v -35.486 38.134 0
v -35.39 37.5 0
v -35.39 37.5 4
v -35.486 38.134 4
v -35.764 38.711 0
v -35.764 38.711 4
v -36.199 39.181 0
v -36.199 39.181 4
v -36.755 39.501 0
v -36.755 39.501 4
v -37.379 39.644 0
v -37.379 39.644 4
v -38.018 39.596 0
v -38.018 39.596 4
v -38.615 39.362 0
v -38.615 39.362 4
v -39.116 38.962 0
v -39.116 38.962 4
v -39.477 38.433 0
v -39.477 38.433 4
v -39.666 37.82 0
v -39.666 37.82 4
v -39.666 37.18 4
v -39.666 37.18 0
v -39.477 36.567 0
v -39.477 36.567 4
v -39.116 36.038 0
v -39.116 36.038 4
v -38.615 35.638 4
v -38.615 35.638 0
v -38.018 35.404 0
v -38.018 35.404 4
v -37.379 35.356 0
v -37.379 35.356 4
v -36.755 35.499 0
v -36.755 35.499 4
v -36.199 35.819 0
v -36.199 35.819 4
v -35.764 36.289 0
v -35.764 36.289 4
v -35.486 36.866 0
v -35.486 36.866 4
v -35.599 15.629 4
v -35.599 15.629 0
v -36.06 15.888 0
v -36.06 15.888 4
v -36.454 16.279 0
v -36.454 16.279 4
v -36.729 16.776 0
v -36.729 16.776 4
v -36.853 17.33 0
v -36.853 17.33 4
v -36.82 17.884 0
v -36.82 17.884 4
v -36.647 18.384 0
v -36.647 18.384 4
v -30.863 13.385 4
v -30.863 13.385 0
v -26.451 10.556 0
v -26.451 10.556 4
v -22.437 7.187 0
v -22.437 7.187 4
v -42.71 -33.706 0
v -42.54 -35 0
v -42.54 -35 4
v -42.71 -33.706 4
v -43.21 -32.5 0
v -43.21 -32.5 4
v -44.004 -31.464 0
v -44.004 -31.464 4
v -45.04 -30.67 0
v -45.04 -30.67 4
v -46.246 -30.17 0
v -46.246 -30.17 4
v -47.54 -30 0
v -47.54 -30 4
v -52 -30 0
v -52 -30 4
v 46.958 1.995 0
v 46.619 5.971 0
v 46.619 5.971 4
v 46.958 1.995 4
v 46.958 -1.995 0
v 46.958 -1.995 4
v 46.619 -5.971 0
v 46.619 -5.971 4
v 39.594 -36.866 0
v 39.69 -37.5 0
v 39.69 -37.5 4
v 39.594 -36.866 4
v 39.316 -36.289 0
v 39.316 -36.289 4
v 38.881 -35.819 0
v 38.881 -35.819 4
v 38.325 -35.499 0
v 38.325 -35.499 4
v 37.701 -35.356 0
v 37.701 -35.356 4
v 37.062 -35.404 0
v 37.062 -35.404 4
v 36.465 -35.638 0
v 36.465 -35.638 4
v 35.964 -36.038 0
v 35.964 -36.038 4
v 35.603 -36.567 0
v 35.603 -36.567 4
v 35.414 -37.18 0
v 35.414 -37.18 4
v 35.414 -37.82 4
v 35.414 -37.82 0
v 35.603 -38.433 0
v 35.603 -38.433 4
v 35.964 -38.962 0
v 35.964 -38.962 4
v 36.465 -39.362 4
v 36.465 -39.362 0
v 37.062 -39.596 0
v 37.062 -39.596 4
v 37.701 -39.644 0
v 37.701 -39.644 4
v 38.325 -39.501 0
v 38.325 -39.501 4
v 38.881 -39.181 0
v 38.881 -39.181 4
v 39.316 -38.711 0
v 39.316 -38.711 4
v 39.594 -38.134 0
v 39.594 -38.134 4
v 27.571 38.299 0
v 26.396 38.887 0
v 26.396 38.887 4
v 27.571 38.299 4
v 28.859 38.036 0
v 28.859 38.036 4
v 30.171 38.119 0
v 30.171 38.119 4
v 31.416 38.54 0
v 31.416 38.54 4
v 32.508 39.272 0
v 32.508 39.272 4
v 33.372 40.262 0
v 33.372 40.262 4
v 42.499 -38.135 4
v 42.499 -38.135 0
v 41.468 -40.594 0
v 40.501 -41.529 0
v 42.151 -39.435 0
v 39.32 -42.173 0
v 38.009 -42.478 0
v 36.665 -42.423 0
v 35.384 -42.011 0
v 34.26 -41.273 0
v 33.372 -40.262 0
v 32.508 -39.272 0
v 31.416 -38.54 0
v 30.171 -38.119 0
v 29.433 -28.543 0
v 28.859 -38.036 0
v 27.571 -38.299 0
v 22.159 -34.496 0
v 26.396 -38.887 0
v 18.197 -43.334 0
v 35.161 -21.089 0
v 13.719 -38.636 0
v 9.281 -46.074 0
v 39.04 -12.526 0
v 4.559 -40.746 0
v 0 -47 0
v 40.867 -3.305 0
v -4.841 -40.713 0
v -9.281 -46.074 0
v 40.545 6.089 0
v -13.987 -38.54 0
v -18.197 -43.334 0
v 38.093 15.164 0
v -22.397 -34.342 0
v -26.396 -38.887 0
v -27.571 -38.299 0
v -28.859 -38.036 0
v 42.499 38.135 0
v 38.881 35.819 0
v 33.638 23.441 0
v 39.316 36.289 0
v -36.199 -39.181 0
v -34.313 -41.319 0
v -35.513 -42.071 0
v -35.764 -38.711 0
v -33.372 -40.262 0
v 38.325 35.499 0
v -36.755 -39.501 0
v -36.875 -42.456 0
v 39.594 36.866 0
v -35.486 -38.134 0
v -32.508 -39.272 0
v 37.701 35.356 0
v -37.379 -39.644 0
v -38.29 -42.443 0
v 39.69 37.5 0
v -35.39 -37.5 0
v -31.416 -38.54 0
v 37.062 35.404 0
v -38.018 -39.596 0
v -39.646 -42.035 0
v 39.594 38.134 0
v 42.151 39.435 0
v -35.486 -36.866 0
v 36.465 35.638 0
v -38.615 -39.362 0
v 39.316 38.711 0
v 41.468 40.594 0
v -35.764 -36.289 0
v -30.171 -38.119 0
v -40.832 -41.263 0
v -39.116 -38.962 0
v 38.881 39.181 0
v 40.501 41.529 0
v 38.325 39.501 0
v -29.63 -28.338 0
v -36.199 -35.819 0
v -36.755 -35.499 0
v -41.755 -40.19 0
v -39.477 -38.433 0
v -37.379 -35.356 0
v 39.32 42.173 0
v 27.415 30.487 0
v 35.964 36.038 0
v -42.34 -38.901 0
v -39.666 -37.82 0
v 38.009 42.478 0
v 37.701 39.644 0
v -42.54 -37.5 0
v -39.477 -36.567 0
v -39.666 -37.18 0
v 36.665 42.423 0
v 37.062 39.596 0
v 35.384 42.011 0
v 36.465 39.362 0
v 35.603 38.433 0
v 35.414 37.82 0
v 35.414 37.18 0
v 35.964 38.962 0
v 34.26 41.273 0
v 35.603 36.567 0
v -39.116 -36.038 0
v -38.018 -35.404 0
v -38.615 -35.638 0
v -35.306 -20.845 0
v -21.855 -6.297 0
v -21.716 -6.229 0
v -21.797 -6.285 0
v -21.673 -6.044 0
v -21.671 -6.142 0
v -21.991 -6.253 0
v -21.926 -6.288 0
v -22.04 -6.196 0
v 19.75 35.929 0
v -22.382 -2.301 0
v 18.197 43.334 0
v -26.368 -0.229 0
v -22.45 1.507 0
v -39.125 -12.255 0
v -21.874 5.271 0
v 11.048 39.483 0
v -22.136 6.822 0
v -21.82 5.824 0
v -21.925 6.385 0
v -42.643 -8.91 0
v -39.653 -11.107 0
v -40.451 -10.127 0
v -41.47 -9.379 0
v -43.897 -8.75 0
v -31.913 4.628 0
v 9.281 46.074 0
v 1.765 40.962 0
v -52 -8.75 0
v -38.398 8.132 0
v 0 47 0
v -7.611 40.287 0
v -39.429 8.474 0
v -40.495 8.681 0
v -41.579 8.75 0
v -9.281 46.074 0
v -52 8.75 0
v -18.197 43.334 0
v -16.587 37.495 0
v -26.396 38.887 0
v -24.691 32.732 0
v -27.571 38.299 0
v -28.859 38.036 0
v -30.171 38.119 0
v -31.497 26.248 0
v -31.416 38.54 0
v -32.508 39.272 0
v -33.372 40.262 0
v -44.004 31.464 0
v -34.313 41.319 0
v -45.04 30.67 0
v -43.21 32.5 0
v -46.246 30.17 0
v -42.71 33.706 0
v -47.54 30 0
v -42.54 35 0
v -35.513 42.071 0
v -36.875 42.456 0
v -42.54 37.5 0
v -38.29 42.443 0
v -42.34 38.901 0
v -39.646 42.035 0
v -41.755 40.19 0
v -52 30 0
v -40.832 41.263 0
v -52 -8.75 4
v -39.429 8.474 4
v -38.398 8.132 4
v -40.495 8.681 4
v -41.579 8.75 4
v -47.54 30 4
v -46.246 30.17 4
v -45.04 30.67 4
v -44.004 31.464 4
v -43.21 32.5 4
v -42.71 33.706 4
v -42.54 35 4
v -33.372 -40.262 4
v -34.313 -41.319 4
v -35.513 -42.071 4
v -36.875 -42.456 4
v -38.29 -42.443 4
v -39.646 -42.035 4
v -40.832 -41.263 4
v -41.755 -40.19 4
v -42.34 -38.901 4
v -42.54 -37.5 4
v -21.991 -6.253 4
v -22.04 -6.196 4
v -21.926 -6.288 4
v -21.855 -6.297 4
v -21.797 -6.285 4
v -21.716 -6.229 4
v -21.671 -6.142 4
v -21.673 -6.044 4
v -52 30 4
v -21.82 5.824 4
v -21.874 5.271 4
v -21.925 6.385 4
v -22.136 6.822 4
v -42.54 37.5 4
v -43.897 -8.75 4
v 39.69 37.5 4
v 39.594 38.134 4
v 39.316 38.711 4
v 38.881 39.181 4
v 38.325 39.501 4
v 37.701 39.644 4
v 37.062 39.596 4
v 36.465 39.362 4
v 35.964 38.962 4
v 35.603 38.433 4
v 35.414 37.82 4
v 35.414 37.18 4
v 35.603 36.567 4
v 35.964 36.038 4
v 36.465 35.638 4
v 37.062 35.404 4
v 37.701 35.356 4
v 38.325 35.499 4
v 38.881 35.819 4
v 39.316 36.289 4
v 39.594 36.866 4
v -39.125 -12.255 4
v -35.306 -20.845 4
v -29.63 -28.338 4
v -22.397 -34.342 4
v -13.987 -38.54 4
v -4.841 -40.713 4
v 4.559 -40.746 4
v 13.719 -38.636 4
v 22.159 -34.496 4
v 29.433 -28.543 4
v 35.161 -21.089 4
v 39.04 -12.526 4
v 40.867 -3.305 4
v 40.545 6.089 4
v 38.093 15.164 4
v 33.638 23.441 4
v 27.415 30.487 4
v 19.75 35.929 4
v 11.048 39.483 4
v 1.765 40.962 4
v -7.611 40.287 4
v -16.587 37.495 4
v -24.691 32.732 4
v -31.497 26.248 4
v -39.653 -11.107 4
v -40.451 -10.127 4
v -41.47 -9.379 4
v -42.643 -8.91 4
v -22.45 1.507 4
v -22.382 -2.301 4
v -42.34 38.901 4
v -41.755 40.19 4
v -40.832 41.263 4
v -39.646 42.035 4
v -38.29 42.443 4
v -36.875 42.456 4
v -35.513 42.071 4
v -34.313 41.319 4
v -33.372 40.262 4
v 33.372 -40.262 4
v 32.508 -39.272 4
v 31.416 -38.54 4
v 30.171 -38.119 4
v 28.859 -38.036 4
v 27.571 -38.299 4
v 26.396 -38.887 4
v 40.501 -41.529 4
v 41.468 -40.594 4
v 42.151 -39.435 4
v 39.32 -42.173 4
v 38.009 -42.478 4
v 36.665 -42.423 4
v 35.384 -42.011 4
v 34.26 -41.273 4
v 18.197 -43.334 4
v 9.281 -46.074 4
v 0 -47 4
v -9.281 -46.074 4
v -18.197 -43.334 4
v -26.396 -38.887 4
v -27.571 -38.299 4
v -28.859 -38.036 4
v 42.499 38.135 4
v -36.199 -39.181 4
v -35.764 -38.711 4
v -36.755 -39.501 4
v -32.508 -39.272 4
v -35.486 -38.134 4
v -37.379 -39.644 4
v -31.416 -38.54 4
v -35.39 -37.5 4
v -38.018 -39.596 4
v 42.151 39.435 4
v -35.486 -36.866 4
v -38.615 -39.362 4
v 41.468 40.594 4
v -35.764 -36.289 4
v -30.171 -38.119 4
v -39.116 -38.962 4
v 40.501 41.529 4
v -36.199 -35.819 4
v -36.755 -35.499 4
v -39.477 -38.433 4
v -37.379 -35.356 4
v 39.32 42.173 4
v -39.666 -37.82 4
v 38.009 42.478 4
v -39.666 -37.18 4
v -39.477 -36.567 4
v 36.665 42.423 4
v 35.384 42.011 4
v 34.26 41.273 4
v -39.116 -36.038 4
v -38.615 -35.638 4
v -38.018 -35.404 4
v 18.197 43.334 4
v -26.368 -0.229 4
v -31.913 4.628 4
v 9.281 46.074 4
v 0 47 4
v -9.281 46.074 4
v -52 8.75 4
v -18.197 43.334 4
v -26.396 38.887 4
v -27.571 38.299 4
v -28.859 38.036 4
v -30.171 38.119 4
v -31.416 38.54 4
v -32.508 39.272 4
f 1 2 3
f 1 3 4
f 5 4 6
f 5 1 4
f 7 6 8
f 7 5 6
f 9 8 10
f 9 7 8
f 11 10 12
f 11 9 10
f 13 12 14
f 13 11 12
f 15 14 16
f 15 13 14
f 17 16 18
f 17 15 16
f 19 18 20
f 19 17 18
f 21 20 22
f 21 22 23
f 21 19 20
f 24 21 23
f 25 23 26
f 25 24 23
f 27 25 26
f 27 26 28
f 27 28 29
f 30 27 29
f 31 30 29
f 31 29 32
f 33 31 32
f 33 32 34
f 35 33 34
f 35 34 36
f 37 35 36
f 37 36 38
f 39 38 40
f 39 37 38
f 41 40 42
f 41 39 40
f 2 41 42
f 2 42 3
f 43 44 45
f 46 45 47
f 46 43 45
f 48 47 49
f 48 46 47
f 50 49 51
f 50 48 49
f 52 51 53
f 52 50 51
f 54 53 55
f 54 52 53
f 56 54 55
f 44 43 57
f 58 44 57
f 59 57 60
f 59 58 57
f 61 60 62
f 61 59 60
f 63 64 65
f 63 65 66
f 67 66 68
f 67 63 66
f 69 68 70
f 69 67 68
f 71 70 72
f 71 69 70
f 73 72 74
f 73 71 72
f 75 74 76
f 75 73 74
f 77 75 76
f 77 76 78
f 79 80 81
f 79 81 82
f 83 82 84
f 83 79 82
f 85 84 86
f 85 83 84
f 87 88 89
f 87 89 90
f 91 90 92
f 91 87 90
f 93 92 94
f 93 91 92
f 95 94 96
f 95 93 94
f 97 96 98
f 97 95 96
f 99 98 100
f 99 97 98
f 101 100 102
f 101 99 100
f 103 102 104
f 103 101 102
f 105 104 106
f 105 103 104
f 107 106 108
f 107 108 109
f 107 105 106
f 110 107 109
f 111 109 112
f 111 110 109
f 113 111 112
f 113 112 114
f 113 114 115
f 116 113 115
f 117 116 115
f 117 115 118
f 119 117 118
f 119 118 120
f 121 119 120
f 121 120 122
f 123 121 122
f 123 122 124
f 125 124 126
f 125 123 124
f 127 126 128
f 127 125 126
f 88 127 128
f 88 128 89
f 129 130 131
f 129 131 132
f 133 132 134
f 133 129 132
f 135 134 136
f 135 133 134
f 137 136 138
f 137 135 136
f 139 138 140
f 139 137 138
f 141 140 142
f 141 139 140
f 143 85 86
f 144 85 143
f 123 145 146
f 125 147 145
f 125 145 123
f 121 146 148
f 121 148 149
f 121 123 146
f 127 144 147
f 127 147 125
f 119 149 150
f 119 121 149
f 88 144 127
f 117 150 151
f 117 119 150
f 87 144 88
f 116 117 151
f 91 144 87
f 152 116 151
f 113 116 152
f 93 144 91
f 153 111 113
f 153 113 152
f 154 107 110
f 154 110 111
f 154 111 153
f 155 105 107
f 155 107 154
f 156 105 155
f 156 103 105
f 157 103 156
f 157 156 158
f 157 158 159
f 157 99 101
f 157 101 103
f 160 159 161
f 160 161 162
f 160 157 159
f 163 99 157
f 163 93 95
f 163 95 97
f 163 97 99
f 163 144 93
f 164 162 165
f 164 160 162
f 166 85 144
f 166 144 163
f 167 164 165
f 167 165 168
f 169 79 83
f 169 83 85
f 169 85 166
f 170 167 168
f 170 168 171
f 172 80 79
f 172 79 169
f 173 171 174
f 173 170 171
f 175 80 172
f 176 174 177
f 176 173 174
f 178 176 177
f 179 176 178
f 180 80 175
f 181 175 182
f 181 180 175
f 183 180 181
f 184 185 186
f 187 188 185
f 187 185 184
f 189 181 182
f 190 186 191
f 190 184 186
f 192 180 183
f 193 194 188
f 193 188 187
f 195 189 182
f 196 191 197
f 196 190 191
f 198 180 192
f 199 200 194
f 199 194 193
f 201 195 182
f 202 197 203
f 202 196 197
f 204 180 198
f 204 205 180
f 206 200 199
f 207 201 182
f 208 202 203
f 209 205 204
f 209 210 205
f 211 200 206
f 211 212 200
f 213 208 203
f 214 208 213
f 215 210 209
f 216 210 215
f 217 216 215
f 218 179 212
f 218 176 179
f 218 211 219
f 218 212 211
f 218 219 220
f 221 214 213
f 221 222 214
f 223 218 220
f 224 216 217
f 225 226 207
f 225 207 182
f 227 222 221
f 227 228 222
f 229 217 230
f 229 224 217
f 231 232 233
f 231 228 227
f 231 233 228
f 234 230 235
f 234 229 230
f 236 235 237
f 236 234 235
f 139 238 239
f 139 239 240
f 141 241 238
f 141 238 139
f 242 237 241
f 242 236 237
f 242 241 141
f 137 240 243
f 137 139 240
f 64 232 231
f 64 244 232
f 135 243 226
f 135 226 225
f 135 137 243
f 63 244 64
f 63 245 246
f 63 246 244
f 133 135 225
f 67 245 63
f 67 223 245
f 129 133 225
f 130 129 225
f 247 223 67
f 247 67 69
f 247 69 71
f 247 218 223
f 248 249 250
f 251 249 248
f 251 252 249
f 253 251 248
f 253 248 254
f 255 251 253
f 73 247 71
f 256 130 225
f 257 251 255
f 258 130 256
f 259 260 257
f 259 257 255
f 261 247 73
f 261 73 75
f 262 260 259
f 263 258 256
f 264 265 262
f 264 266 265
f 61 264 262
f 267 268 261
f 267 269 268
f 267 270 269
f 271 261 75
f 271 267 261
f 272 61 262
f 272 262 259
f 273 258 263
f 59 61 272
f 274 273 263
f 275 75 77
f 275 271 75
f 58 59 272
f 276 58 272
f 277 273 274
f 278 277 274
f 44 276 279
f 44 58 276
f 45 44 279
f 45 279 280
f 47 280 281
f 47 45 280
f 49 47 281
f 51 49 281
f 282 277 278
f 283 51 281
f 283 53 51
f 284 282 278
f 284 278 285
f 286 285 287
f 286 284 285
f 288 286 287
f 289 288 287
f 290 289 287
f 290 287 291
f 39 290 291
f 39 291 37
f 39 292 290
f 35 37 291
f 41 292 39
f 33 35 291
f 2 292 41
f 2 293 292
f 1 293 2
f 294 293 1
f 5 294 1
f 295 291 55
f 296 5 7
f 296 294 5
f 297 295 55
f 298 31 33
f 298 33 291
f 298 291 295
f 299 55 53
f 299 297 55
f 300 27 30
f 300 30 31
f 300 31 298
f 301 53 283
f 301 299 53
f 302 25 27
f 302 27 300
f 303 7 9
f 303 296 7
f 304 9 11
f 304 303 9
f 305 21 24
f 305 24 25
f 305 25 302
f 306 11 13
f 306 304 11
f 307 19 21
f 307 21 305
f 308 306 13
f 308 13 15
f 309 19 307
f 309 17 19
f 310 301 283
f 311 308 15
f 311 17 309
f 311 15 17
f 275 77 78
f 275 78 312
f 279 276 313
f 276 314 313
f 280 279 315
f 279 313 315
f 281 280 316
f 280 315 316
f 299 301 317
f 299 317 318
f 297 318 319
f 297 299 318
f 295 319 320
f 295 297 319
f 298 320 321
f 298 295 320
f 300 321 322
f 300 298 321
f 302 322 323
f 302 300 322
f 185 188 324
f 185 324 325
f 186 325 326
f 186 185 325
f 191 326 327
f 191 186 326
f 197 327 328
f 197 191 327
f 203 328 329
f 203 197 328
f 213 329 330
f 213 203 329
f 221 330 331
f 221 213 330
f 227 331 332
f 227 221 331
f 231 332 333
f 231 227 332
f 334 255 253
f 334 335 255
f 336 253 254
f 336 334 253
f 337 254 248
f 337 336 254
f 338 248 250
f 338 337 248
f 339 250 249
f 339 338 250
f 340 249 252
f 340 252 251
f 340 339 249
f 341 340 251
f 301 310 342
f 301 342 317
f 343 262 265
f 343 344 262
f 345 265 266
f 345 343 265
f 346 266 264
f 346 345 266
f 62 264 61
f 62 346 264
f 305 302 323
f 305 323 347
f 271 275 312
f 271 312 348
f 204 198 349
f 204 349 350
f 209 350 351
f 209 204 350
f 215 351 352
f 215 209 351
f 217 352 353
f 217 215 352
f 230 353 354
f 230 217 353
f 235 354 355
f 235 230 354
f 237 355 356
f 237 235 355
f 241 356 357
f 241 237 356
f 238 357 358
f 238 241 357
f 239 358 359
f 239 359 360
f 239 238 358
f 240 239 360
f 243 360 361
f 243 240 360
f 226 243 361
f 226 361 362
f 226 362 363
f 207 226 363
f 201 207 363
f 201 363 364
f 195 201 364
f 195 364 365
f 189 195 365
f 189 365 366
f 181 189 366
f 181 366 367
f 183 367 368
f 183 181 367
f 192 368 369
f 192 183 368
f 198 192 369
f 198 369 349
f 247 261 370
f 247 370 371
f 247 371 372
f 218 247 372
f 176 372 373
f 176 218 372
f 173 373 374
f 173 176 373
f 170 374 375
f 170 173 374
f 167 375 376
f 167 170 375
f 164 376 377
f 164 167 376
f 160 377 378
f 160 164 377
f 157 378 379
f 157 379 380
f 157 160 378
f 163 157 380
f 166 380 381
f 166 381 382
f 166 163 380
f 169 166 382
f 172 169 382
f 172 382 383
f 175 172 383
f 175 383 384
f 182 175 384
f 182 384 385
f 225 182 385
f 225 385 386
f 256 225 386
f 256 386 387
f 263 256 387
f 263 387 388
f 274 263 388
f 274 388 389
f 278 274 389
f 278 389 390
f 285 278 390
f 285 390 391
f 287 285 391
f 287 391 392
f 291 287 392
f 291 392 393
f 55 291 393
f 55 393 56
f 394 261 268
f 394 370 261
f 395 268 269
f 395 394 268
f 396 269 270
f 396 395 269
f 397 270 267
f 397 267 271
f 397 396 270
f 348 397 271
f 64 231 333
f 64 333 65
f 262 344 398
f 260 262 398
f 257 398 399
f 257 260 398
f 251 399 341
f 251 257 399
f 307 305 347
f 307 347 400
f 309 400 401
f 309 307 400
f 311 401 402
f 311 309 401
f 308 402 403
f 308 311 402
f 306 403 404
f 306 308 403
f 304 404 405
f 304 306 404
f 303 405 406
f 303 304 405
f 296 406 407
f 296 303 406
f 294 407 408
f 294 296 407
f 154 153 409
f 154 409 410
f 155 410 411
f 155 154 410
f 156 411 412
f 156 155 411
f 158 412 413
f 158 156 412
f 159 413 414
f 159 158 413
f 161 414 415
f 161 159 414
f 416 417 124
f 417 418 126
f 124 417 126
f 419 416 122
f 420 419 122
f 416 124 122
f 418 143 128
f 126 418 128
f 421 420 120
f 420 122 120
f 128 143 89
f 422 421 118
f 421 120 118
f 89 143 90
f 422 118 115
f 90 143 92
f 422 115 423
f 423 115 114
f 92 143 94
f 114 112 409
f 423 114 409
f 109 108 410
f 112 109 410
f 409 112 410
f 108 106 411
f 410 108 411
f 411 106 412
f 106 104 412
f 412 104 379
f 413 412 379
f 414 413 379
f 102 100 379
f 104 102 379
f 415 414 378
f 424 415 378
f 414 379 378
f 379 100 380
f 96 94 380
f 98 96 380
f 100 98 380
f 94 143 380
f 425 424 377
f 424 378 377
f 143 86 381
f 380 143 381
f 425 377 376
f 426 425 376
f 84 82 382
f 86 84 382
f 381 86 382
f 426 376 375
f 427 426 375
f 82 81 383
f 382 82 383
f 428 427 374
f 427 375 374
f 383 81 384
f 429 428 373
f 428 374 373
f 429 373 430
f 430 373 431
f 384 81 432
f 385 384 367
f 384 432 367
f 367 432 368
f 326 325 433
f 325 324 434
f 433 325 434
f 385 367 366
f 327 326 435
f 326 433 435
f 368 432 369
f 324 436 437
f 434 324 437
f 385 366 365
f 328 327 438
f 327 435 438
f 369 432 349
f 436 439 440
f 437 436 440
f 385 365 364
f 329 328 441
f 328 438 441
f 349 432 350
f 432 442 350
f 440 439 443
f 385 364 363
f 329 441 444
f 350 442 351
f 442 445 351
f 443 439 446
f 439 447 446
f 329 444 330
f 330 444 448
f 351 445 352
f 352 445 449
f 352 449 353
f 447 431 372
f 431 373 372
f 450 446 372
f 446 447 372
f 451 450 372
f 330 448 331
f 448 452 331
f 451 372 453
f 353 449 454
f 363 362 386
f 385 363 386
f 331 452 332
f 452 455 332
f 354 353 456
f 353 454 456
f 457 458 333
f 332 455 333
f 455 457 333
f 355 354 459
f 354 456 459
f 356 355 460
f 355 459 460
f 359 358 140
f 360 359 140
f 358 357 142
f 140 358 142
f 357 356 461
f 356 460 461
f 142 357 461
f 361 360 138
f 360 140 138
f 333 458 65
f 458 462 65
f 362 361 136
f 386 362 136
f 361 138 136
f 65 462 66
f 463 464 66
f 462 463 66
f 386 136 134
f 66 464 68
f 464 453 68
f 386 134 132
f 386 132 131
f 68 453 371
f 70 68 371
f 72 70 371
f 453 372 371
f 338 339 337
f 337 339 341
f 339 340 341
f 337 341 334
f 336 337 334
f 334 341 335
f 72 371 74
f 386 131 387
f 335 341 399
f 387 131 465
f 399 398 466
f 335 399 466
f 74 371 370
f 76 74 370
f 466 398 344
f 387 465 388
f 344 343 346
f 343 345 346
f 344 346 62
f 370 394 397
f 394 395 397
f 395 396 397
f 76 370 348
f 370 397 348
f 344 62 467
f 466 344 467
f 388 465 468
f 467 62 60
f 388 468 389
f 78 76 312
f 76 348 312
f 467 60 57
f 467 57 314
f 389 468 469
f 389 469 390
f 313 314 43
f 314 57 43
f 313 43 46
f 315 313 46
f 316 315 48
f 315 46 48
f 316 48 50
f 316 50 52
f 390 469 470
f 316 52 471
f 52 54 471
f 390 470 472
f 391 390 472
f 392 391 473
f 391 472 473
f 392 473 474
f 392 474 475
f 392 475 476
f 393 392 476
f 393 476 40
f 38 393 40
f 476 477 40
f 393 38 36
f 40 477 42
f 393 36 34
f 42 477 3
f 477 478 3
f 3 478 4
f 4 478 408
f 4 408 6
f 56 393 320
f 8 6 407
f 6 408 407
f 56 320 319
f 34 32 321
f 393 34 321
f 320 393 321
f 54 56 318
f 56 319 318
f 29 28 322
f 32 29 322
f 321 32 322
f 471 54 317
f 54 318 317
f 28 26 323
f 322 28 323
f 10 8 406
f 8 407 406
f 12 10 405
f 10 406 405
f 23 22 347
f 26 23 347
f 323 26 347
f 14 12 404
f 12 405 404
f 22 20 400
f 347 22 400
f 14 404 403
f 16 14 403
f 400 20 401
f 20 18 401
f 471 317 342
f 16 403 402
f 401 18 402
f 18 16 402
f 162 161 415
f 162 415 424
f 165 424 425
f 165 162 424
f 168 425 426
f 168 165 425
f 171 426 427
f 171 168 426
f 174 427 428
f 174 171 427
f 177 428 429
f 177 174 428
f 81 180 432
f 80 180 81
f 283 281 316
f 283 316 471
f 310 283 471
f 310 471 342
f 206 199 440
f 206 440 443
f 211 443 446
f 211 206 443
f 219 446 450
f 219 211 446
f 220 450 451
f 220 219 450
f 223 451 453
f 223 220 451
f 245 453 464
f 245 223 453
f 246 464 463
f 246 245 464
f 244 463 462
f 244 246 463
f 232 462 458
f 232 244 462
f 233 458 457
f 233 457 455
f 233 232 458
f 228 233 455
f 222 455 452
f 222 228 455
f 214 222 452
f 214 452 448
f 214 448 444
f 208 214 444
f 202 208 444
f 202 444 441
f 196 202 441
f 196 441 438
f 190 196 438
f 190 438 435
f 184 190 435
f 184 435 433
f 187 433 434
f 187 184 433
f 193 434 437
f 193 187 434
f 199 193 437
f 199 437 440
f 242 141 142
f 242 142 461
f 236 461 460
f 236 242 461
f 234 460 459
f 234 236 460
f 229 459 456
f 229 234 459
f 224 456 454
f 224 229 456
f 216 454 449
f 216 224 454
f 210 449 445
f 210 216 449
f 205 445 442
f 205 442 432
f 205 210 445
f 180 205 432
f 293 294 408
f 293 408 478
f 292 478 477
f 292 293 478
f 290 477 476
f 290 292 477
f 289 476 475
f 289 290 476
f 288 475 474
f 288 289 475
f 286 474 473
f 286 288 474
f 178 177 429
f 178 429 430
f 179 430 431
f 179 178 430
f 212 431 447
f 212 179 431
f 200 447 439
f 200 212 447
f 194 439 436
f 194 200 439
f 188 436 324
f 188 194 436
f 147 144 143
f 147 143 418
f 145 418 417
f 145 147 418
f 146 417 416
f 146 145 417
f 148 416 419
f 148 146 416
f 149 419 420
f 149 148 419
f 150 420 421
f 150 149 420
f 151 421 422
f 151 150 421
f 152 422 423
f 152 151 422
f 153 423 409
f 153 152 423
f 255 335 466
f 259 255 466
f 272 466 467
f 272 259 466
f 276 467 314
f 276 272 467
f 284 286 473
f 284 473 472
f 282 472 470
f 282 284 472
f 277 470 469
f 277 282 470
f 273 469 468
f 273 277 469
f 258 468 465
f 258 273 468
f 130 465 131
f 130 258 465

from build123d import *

# Parameters (mm, degrees)
SKETCH_1_R      = 2.15
EXTRUDE_1_DEPTH = 4
FILLET_1_R      = 0.2
FILLET_2_R      = 2
FILLET_3_R      = 2
FILLET_4_R      = 8.5
FILLET_5_R      = 5


with BuildPart() as part:
    # 草图1 → 凸台-拉伸1 (new body)
    with BuildSketch(Plane.XY):
        with BuildLine():
            Line((-52, 8.75), (-52, 30))
            Line((-52, 30), (-47.54, 30))
            ThreePointArc((-47.54, 30), (-44.004466094, 31.464466094), (-42.54, 35))
            Line((-42.54, 35), (-42.54, 37.5))
            ThreePointArc((-42.54, 37.5), (-38.982425028, 42.287422066), (-33.372235985, 40.262198963))
            ThreePointArc((-33.372235985, 40.262198963), (-30.171244586, 38.118753147), (-26.396349665, 38.887436588))
            ThreePointArc((-26.396349665, 38.887436588), (0, 47), (26.396349665, 38.887436588))
            ThreePointArc((26.396349665, 38.887436588), (30.171244586, 38.118753147), (33.372235985, 40.262198963))
            ThreePointArc((33.372235985, 40.262198963), (38.674773042, 42.369526686), (42.499484755, 38.135225128))
            Line((42.499484755, 38.135225128), (46.619156699, 5.971116201))
            ThreePointArc((46.619156699, 5.971116201), (47, 0), (46.619156699, -5.971116201))
            Line((46.619156699, -5.971116201), (42.499484755, -38.135225128))
            ThreePointArc((42.499484755, -38.135225128), (38.674773042, -42.369526686), (33.372235985, -40.262198963))
            ThreePointArc((33.372235985, -40.262198963), (30.171244586, -38.118753147), (26.396349665, -38.887436588))
            ThreePointArc((26.396349665, -38.887436588), (0, -47), (-26.396349665, -38.887436588))
            ThreePointArc((-26.396349665, -38.887436588), (-30.171244586, -38.118753147), (-33.372235985, -40.262198963))
            ThreePointArc((-33.372235985, -40.262198963), (-38.982425028, -42.287422066), (-42.54, -37.5))
            Line((-42.54, -37.5), (-42.54, -35))
            ThreePointArc((-42.54, -35), (-44.004466094, -31.464466094), (-47.54, -30))
            Line((-47.54, -30), (-52, -30))
            Line((-52, -30), (-52, -8.75))
            Line((-52, -8.75), (-40.055430343, -8.75))
            ThreePointArc((-40.055430343, -8.75), (40.804364959, -4.000475011), (-37.593370285, 16.362717092))
            ThreePointArc((-37.593370285, 16.362717092), (-29.005163231, 12.290176631), (-21.585495377, 6.349518825))
            ThreePointArc((-21.585495377, 6.349518825), (-22.451945258, -1.469746278), (-20.573530425, -9.10932741))
            ThreePointArc((-20.573530425, -9.10932741), (-28.44850534, 1.855840669), (-40.055430343, 8.75))
            Line((-40.055430343, 8.75), (-52, 8.75))
        make_face()
        with Locations((-37.54, 37.5)):
            Circle(SKETCH_1_R, mode=Mode.SUBTRACT)
        with Locations((-37.54, -37.5)):
            Circle(SKETCH_1_R, mode=Mode.SUBTRACT)
        with Locations((37.54, -37.5)):
            Circle(SKETCH_1_R, mode=Mode.SUBTRACT)
        with Locations((37.54, 37.5)):
            Circle(SKETCH_1_R, mode=Mode.SUBTRACT)
    extrude(amount=EXTRUDE_1_DEPTH)

    # 圆角1
    fillet_1_edges = [part.edges().sort_by_distance(p)[0] for p in [
        (-20.573530425, -9.10932741, 2),
    ]]
    fillet(fillet_1_edges, radius=FILLET_1_R)

    # 圆角2
    fillet_2_edges = [part.edges().sort_by_distance(p)[0] for p in [
        (-21.585495377, 6.349518825, 2),
    ]]
    fillet(fillet_2_edges, radius=FILLET_2_R)

    # 圆角3
    fillet_3_edges = [part.edges().sort_by_distance(p)[0] for p in [
        (-37.593370285, 16.362717092, 2),
    ]]
    fillet(fillet_3_edges, radius=FILLET_3_R)

    # 圆角4
    fillet_4_edges = [part.edges().sort_by_distance(p)[0] for p in [
        (-40.055430343, 8.75, 2),
    ]]
    fillet(fillet_4_edges, radius=FILLET_4_R)

    # 圆角5
    fillet_5_edges = [part.edges().sort_by_distance(p)[0] for p in [
        (-40.055430343, -8.75, 2),
    ]]
    fillet(fillet_5_edges, radius=FILLET_5_R)


solid = part.part
